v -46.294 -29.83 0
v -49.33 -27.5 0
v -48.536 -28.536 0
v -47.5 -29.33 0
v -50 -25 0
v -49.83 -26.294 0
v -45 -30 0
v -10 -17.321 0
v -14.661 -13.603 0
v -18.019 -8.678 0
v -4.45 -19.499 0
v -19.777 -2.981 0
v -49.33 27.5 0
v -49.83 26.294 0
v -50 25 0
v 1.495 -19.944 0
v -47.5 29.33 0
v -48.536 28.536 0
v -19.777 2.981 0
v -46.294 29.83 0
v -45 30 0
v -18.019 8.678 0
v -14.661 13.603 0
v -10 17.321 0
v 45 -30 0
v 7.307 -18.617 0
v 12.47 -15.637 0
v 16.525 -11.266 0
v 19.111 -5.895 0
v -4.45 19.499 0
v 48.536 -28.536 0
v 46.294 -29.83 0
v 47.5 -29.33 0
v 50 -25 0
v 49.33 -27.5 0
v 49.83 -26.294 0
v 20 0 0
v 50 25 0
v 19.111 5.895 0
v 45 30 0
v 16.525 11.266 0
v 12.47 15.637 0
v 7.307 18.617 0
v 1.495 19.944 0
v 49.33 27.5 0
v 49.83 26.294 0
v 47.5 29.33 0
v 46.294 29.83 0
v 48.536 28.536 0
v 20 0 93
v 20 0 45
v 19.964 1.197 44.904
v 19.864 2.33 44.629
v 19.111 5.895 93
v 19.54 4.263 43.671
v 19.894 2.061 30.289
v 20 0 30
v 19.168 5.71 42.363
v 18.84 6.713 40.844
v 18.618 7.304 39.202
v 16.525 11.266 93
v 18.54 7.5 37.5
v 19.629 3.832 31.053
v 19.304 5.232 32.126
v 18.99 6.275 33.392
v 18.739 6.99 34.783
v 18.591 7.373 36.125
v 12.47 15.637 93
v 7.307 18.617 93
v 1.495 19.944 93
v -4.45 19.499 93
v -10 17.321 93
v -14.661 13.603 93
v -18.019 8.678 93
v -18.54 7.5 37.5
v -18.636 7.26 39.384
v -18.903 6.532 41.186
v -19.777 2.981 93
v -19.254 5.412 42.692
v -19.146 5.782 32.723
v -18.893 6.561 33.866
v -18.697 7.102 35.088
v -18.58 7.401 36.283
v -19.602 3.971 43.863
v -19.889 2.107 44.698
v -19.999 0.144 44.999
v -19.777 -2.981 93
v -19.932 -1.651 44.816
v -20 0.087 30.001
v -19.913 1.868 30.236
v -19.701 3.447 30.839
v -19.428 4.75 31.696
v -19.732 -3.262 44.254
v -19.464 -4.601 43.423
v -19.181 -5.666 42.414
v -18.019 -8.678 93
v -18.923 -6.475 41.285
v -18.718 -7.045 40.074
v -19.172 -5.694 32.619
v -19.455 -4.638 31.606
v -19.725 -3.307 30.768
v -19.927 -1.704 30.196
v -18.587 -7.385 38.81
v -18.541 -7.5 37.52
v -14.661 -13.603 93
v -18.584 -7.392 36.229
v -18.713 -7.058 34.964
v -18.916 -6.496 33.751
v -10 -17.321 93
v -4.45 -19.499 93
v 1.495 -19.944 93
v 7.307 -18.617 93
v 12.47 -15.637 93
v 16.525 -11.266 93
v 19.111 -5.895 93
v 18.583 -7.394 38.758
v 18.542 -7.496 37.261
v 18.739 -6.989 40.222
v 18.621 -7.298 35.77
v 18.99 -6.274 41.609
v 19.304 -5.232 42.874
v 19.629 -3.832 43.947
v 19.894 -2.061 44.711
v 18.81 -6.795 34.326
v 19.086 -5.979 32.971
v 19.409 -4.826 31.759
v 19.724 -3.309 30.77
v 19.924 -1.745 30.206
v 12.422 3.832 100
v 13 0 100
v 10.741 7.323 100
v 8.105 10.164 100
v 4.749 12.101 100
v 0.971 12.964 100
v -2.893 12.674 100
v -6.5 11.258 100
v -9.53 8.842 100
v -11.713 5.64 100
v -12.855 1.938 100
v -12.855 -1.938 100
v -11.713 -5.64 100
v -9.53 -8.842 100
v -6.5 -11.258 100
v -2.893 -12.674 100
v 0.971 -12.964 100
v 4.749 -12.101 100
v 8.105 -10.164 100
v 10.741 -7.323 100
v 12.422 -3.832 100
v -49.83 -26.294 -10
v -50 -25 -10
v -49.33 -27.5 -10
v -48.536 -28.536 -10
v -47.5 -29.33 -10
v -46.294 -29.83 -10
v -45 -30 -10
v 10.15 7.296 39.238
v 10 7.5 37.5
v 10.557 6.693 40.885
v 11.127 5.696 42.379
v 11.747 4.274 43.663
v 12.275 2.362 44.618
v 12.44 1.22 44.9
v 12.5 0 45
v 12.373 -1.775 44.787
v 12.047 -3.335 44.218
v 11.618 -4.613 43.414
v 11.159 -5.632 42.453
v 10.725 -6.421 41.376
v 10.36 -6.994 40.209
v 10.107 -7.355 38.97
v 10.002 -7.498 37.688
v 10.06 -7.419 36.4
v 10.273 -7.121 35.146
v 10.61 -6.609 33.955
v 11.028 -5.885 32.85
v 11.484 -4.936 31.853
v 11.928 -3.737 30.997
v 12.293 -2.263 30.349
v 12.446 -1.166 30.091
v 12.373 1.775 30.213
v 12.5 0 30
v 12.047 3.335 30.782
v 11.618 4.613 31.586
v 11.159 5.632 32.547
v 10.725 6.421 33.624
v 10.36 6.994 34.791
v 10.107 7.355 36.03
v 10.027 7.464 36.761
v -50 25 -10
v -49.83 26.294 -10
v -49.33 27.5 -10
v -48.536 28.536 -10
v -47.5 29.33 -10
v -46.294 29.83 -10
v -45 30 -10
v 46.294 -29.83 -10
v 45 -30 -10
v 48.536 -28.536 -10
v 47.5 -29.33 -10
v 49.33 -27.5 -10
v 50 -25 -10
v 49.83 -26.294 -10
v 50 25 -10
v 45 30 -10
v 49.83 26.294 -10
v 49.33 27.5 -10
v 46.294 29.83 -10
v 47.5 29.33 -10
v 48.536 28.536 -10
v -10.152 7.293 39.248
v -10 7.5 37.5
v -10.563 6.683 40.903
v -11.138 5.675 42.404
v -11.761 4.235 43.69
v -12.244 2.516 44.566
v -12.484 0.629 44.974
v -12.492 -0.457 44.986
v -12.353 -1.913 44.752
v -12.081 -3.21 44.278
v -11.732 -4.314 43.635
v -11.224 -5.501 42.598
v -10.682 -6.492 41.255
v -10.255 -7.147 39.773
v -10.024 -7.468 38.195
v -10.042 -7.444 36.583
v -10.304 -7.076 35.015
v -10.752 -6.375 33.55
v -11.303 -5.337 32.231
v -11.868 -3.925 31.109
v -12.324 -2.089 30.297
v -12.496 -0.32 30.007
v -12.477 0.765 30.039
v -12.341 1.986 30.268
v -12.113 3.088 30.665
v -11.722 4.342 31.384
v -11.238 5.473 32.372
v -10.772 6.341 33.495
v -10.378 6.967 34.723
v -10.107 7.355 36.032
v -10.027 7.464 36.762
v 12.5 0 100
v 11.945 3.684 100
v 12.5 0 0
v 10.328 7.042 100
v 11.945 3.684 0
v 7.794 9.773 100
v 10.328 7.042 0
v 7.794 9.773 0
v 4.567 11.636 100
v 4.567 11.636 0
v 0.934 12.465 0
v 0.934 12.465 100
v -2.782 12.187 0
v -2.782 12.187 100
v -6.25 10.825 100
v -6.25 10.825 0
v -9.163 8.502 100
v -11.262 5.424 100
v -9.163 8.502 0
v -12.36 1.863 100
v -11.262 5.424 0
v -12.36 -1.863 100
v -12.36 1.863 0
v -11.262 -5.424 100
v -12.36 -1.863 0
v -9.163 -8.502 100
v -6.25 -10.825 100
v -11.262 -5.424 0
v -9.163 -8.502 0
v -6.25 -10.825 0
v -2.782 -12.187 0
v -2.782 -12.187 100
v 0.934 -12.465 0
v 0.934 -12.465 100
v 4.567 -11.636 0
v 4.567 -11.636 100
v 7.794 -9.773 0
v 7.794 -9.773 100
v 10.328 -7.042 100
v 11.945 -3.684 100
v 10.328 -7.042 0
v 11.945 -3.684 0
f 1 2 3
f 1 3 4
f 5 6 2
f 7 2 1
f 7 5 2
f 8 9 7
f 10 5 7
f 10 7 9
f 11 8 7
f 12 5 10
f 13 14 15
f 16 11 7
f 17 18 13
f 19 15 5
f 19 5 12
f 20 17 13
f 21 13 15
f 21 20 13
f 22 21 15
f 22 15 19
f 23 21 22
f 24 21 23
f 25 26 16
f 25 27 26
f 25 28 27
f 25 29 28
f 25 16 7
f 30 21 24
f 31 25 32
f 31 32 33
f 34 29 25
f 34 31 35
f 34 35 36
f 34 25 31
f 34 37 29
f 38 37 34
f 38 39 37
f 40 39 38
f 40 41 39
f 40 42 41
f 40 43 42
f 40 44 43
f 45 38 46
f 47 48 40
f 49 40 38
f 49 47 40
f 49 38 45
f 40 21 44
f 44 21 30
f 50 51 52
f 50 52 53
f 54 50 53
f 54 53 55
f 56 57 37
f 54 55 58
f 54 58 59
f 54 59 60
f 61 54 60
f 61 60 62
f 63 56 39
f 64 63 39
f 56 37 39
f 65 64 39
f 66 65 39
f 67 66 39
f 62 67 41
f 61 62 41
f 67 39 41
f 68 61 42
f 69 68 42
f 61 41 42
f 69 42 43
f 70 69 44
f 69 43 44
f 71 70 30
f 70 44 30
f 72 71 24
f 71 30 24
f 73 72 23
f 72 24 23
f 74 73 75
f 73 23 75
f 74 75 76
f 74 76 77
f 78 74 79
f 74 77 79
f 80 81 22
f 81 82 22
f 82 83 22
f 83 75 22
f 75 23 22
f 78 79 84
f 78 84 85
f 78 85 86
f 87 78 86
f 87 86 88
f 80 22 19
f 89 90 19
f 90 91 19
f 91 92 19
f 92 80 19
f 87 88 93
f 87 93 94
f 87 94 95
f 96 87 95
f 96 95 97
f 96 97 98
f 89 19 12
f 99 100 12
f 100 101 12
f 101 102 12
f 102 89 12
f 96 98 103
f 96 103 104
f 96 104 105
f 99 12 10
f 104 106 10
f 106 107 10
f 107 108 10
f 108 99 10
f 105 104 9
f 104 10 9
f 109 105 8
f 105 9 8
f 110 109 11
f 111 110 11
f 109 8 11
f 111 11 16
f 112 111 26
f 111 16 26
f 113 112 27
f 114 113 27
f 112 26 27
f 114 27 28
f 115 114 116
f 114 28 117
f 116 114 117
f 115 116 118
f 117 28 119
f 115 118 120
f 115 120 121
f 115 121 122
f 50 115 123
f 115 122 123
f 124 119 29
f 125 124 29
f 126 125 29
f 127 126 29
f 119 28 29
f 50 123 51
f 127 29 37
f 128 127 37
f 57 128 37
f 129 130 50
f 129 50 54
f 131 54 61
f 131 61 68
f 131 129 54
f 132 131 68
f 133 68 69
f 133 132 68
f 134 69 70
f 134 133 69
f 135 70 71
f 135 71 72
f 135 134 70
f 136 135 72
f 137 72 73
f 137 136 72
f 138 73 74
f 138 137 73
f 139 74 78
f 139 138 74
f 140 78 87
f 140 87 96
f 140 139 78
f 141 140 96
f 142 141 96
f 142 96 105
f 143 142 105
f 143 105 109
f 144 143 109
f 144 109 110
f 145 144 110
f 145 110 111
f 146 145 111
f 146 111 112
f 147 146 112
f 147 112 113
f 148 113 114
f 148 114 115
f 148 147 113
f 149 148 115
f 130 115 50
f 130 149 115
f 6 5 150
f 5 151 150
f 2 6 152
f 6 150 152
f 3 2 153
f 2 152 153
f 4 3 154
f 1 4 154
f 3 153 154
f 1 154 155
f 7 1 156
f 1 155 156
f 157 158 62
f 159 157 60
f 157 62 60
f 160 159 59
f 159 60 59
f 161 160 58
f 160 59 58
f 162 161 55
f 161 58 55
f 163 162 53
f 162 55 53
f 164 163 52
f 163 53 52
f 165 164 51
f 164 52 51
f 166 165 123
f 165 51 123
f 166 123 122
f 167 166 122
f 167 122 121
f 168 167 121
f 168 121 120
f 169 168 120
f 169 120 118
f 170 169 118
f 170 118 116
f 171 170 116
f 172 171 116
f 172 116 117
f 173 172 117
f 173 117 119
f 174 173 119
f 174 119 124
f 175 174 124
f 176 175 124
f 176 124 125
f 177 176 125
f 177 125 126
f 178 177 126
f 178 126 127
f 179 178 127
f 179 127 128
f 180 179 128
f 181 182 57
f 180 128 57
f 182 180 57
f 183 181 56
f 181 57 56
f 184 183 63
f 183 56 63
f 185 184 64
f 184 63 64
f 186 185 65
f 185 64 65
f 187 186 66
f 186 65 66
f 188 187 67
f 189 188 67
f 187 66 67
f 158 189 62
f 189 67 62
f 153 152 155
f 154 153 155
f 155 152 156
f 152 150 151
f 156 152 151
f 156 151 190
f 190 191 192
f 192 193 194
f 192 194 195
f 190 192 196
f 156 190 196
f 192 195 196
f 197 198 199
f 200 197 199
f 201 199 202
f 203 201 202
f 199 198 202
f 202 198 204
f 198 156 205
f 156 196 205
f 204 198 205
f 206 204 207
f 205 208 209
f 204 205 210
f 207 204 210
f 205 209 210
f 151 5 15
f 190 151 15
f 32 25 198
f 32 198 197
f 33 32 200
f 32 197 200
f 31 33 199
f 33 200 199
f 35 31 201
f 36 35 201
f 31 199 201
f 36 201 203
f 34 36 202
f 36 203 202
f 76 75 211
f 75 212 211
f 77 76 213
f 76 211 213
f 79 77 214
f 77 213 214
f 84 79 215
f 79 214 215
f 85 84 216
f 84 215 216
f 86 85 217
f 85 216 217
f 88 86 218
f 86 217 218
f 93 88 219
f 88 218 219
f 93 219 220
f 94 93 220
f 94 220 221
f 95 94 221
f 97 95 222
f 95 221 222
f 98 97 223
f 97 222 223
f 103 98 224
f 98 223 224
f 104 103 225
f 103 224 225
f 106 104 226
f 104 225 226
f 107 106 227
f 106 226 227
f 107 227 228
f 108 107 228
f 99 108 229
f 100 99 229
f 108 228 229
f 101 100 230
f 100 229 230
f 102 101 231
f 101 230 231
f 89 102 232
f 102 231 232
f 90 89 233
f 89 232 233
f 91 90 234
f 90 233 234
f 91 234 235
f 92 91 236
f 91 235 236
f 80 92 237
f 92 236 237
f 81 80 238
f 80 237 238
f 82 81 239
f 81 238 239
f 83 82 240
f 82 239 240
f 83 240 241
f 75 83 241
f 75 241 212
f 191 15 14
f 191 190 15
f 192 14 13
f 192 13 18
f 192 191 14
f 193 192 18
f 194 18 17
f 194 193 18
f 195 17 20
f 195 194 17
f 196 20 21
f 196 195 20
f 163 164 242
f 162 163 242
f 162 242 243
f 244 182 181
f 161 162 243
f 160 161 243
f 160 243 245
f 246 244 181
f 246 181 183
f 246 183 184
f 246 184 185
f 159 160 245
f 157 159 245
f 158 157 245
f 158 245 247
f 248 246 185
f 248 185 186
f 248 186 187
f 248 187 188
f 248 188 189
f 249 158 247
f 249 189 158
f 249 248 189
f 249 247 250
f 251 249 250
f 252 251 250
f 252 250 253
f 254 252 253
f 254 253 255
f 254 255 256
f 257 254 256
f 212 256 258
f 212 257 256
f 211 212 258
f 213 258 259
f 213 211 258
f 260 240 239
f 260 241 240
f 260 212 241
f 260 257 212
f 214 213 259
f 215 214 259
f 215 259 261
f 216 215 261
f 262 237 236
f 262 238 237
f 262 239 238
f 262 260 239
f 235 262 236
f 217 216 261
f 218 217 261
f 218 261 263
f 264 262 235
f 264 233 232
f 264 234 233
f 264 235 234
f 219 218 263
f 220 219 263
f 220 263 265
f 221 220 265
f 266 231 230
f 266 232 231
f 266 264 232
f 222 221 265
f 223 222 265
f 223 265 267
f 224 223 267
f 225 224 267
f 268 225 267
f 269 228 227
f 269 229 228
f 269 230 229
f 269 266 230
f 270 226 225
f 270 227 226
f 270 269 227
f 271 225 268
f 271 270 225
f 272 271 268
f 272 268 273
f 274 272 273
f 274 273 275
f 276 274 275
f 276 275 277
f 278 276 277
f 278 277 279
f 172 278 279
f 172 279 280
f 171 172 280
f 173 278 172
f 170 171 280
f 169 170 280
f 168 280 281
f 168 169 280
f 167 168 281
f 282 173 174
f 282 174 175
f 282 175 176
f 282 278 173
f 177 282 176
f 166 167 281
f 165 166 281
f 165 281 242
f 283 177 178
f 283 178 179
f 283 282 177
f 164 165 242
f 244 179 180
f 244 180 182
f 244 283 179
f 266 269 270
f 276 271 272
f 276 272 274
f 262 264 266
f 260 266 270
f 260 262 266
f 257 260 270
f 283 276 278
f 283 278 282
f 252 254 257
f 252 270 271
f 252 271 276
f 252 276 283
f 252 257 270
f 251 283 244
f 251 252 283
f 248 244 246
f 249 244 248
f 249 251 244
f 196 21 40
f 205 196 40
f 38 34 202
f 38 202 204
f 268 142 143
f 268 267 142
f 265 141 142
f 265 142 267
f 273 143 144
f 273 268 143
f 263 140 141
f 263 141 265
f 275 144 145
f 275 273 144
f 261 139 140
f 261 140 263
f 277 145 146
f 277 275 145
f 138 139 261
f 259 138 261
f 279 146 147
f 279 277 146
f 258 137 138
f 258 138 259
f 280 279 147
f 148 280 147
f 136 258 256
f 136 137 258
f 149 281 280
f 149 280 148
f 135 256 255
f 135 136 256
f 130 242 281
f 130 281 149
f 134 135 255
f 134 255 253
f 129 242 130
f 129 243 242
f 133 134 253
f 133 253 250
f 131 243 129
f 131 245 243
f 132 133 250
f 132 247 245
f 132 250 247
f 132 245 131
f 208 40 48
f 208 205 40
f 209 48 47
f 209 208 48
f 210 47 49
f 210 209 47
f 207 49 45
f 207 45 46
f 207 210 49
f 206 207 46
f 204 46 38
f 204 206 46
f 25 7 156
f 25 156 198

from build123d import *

# Parameters (mm, degrees)
F0_R     = 20
F0_R_2   = 12.5
F1_DEPTH = 100
F2_W     = 100
F2_H     = 60
F3_DEPTH = 10
F4_R     = 5
F5_SIZE  = 7
F6_R     = 7.5
F7_DEPTH = 20


with BuildPart() as f1:
    # F0 (on Top) → F1 (new body)
    with BuildSketch(Plane.XY):
        Circle(F0_R)
        Circle(F0_R_2, mode=Mode.SUBTRACT)
    extrude(amount=F1_DEPTH)

    # F2 (on Top) → F3 (join)
    with BuildSketch(Plane.XY):
        Rectangle(F2_W, F2_H)
    extrude(amount=-F3_DEPTH)

    # F4
    f4_edges = [f1.edges().sort_by_distance(p)[0] for p in [
        (-50, -30, -5),
        (50, -30, -5),
        (50, 30, -5),
        (-50, 30, -5),
    ]]
    fillet(f4_edges, radius=F4_R)

    # F5
    f5_edges = [f1.edges().sort_by_distance(p)[0] for p in [
        (-20, 0, 100),
    ]]
    chamfer(f5_edges, length=F5_SIZE)

    # F6 (on Right) → F7 (cut, symmetric)
    with BuildSketch(Plane.YZ):
        with Locations((0, 37.5)):
            Circle(F6_R)
    extrude(amount=F7_DEPTH, both=True, mode=Mode.SUBTRACT)


solid = f1.part
